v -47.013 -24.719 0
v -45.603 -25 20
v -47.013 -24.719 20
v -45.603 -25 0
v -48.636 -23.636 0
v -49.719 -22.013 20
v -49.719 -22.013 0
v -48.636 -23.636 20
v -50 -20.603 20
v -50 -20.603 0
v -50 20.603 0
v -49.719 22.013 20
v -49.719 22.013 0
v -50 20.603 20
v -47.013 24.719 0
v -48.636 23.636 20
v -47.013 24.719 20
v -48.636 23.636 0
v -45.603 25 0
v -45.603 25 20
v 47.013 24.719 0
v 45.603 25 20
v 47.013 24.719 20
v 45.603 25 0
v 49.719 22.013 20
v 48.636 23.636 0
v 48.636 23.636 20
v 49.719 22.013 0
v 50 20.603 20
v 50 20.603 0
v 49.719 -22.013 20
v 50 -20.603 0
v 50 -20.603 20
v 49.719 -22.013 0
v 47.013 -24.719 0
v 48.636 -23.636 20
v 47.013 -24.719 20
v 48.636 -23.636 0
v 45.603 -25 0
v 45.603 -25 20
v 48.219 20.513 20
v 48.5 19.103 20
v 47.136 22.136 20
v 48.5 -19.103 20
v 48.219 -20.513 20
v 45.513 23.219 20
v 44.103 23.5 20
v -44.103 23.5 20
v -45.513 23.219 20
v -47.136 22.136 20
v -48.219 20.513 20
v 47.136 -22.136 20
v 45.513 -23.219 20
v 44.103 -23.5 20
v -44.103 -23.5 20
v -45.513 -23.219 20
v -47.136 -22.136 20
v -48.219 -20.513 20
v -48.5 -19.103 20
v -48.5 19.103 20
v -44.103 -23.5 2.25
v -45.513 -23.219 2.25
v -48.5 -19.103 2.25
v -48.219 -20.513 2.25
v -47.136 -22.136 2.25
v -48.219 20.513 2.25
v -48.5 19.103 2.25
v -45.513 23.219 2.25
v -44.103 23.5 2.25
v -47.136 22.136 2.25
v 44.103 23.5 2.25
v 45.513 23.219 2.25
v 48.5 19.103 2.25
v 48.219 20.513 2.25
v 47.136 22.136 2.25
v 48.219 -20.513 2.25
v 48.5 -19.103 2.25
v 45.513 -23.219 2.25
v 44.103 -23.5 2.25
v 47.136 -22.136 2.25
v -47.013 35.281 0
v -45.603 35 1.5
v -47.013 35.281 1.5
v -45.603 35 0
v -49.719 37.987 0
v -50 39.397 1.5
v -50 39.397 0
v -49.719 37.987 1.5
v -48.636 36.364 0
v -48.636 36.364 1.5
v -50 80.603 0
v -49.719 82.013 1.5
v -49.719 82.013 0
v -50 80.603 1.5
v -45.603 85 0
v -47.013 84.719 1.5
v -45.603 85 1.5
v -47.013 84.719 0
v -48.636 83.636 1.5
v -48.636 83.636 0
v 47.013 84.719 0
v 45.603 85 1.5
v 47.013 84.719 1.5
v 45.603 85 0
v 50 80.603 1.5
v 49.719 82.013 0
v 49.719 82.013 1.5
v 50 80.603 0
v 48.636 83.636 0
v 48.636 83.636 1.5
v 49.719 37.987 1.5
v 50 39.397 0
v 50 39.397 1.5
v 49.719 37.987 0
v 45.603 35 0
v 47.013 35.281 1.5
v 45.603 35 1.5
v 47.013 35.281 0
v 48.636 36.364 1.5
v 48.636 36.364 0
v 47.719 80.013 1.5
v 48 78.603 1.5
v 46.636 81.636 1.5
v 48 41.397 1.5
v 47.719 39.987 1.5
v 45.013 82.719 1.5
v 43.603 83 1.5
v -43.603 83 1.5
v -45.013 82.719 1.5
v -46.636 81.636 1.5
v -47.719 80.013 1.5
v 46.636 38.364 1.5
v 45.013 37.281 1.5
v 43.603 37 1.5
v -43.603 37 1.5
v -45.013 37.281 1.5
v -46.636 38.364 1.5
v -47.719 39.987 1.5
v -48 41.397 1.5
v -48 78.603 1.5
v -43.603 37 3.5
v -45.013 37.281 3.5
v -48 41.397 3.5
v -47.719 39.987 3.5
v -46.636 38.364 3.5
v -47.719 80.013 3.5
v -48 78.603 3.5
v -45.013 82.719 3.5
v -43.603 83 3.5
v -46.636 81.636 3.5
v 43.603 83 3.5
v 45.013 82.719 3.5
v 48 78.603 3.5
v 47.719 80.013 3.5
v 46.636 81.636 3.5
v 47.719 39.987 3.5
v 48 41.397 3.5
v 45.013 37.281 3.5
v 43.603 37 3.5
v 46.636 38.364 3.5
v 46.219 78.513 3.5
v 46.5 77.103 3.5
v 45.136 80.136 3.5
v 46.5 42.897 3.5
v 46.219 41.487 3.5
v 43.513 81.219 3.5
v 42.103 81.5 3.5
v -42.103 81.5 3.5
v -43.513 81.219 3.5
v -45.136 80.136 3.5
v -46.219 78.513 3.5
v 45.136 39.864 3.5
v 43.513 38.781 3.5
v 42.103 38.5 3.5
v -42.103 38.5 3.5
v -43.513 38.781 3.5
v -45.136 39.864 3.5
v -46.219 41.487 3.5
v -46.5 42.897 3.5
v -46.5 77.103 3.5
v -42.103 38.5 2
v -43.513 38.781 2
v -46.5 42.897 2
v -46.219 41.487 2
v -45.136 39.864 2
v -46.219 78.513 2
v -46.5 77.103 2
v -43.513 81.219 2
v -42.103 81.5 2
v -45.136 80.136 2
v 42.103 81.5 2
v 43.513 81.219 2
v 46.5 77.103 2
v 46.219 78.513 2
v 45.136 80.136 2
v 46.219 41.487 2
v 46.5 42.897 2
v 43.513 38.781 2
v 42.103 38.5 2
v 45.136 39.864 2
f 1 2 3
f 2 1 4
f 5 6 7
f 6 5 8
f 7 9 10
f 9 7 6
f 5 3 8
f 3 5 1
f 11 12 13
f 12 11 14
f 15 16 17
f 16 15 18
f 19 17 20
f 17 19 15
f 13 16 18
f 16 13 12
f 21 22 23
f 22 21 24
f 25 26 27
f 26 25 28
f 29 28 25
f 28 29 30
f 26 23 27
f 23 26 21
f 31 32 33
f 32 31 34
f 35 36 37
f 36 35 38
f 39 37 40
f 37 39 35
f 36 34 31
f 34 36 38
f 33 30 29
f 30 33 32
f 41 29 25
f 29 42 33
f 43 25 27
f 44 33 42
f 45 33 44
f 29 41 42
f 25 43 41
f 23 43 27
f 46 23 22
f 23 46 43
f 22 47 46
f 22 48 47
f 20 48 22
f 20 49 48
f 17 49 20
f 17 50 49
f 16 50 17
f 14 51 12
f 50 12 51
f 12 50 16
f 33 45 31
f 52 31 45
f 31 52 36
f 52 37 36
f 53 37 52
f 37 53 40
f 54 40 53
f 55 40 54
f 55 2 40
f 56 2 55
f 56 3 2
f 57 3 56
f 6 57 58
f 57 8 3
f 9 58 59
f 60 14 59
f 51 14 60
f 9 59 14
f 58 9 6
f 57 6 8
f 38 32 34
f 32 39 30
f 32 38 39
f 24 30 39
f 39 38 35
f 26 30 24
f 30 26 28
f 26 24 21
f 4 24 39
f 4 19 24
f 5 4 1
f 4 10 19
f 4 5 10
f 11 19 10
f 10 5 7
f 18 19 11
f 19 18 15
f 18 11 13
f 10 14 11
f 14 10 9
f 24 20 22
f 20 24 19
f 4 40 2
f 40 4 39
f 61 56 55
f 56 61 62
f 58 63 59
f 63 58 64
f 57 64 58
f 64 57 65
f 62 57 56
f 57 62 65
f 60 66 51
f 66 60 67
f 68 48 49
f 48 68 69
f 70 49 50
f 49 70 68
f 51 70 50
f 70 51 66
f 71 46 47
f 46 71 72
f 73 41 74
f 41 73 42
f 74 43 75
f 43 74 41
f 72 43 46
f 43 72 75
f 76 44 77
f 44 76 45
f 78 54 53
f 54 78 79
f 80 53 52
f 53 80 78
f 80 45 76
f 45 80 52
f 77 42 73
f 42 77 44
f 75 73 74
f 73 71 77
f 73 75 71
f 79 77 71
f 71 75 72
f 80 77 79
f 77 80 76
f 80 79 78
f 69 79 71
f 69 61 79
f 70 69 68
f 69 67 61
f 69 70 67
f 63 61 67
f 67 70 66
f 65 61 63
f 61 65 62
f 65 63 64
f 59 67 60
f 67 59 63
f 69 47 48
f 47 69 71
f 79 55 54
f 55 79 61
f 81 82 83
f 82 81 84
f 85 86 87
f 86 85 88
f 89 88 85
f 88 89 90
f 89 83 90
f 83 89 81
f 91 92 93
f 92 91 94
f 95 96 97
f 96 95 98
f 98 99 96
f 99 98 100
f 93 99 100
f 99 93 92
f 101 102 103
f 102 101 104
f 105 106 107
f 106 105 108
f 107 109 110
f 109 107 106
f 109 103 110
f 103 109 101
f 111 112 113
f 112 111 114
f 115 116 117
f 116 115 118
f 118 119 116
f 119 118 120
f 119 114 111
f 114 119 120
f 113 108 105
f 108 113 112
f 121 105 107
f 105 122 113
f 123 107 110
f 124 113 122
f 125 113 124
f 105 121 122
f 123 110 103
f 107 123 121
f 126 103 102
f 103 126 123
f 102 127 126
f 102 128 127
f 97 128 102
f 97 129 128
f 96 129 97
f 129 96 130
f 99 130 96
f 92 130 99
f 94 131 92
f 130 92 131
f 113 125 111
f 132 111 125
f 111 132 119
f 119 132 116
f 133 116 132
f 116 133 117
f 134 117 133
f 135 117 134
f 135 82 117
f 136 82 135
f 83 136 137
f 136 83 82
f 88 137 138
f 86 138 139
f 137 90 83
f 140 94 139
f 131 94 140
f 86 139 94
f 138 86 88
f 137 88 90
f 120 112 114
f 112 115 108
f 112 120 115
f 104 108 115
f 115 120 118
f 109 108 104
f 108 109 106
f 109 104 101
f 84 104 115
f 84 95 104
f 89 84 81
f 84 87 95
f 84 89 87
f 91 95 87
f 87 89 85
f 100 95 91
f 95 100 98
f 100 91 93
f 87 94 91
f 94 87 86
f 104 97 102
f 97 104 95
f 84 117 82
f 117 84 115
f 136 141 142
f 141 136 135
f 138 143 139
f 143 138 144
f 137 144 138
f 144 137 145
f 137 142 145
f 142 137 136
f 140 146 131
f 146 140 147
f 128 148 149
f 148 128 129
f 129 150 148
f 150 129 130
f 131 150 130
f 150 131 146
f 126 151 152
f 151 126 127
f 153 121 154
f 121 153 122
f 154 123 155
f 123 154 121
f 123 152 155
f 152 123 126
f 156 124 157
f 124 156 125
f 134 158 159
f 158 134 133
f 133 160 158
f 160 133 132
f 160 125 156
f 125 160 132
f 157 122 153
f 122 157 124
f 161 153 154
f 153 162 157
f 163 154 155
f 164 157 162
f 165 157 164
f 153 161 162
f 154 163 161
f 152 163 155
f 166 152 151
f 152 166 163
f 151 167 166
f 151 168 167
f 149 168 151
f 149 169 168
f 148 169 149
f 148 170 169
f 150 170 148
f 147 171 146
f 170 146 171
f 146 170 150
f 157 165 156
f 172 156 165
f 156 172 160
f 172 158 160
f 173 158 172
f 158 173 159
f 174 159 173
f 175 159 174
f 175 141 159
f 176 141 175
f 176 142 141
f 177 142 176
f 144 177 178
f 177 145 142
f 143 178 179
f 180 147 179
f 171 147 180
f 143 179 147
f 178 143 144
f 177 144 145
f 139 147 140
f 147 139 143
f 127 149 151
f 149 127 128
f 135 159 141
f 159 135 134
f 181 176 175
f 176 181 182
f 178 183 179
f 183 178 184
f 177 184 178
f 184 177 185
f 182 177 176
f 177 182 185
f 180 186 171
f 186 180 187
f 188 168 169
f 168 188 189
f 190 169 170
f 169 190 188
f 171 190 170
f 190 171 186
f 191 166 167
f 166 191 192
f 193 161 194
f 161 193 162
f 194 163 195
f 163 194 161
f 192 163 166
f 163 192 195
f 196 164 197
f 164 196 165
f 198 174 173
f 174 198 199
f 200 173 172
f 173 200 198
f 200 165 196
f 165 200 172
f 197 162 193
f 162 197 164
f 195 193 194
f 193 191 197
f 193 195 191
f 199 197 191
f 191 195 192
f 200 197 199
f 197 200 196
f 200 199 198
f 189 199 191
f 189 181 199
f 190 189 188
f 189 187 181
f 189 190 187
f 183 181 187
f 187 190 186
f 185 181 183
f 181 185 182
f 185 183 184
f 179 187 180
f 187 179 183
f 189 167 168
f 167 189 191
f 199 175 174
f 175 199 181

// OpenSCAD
//
// Customized Enclosure
//

/*[Dimensions]*/

// Width of the enclosure
width = 100.0;
// Height of the enclosure
height = 50.0;
// Depth of the enclosure
depth = 20.0;
// Thickness of the walls and lid
thickness = 1.5;
// Amount of corner rounding
fillet_radius = 5.0;

/* [Lid] */

// Lid Type
lid_type = "Partial"; //[None, Simple, Partial, Full]
// Width of partial lip
lip_width = 4;
// Additional height added to lip
lip_added_height = 1;
// Extra Lid spacing
lid_space = 1;


if (lid_type == "None") {
    enclosure(width, height, depth, fillet_radius, thickness);
}
if (lid_type == "Simple") {
    enclosure(width, height, depth, fillet_radius, thickness);
    simple_lid(width, height, fillet_radius, thickness);
}
if (lid_type == "Partial") {
    enclosure(width, height, depth, fillet_radius, thickness);
    partial_lip_lid(width, height, fillet_radius, thickness);
}
if (lid_type == "Full") {
    enclosure(width, height, depth, fillet_radius, thickness);
    full_lip_lid(width, height, fillet_radius, thickness);
}

// 
// builds a solid rectangle with rounded corners (Z-only)
//
module block(width, height, depth, fillet_radius) {
    
    difference() {
        cube([width, height, depth], center = true);
        
        fudge = 0.1;
        fudge_depth = depth + 1.0;
        
        translate([-(width / 2 + fudge), -(height / 2 + fudge), -(fudge_depth / 2)])
        intersection () {
            cube([fillet_radius, fillet_radius, fudge_depth], center = false); 
            difference() {
                    cube([2 * fillet_radius, 2 * fillet_radius, fudge_depth], center = false); 
                    translate([fillet_radius, fillet_radius, 0.0])
                    cylinder(r = fillet_radius, h = fudge_depth);
            }
        }

        translate([-(width / 2 + fudge), (height / 2 + fudge), -(fudge_depth / 2)])
        rotate([0.0, 0.0, -90])
        intersection () {
            cube([fillet_radius, fillet_radius, fudge_depth], center = false); 
            difference() {
                    cube([2 * fillet_radius, 2 * fillet_radius, fudge_depth], center = false); 
                    translate([fillet_radius, fillet_radius, 0.0])
                    cylinder(r = fillet_radius, h = fudge_depth);
            }
        }

        translate([(width / 2 + fudge), (height / 2 + fudge), -(fudge_depth / 2)])
        rotate([0.0, 0.0, 180])
        intersection () {
            cube([fillet_radius, fillet_radius, fudge_depth], center = false); 
            difference() {
                    cube([2 * fillet_radius, 2 * fillet_radius, fudge_depth], center = false); 
                    translate([fillet_radius, fillet_radius, 0.0])
                    cylinder(r = fillet_radius, h = fudge_depth);
            }
        }

        translate([(width / 2 + fudge), -(height / 2 + fudge), -(fudge_depth / 2)])
        rotate([0.0, 0.0, 90])
        intersection () {
            cube([fillet_radius, fillet_radius, fudge_depth], center = false); 
            difference() {
                    cube([2 * fillet_radius, 2 * fillet_radius, fudge_depth], center = false); 
                    translate([fillet_radius, fillet_radius, 0.0])
                    cylinder(r = fillet_radius, h = fudge_depth);
            }
        }
    }
}

module enclosure(width, height, depth, fillet_radius, thickness) {
    translate([0.0, 0.0, depth / 2.0])
    difference() {
        block(width, height, depth, fillet_radius);
        translate([0.0, 0.0, thickness]) 
            block(width - (2 * thickness), height - (2 * thickness), depth - thickness, fillet_radius);
    }
}

module simple_lid(width, height, fillet_radius, thickness) {
    translate([0.0, height + 10, thickness / 2.0])
        block(width, height, thickness, fillet_radius);
}

module partial_lip_lid(width, height, fillet_radius, thickness) {
    difference() {
        union() {
            translate([0.0, height + 10, thickness / 2.0])
                block(width, height, thickness, fillet_radius);
            translate([0.0, height + 10, thickness / 2.0 + thickness])
                block(width - (2 * thickness) - lid_space, height - (2 * thickness) - lid_space, thickness + lip_added_height, fillet_radius);
        }
        translate([0.0, height + 10, thickness / 2.0 + thickness + 1])
            block((width - (2 * thickness)) - lip_width, (height - (2 * thickness)) - lip_width, thickness + lip_added_height, fillet_radius );
    }
}

module full_lip_lid(width, height, fillet_radius, thickness) {
    union() {
        translate([0.0, height + 10, thickness / 2.0])
            block(width, height, thickness, fillet_radius);
        translate([0.0, height + 10, thickness / 2.0 + thickness])
            block(width - (2 * thickness) - lid_space, height - (2 * thickness) - lid_space, thickness + lip_added_height, fillet_radius);
    }
}
